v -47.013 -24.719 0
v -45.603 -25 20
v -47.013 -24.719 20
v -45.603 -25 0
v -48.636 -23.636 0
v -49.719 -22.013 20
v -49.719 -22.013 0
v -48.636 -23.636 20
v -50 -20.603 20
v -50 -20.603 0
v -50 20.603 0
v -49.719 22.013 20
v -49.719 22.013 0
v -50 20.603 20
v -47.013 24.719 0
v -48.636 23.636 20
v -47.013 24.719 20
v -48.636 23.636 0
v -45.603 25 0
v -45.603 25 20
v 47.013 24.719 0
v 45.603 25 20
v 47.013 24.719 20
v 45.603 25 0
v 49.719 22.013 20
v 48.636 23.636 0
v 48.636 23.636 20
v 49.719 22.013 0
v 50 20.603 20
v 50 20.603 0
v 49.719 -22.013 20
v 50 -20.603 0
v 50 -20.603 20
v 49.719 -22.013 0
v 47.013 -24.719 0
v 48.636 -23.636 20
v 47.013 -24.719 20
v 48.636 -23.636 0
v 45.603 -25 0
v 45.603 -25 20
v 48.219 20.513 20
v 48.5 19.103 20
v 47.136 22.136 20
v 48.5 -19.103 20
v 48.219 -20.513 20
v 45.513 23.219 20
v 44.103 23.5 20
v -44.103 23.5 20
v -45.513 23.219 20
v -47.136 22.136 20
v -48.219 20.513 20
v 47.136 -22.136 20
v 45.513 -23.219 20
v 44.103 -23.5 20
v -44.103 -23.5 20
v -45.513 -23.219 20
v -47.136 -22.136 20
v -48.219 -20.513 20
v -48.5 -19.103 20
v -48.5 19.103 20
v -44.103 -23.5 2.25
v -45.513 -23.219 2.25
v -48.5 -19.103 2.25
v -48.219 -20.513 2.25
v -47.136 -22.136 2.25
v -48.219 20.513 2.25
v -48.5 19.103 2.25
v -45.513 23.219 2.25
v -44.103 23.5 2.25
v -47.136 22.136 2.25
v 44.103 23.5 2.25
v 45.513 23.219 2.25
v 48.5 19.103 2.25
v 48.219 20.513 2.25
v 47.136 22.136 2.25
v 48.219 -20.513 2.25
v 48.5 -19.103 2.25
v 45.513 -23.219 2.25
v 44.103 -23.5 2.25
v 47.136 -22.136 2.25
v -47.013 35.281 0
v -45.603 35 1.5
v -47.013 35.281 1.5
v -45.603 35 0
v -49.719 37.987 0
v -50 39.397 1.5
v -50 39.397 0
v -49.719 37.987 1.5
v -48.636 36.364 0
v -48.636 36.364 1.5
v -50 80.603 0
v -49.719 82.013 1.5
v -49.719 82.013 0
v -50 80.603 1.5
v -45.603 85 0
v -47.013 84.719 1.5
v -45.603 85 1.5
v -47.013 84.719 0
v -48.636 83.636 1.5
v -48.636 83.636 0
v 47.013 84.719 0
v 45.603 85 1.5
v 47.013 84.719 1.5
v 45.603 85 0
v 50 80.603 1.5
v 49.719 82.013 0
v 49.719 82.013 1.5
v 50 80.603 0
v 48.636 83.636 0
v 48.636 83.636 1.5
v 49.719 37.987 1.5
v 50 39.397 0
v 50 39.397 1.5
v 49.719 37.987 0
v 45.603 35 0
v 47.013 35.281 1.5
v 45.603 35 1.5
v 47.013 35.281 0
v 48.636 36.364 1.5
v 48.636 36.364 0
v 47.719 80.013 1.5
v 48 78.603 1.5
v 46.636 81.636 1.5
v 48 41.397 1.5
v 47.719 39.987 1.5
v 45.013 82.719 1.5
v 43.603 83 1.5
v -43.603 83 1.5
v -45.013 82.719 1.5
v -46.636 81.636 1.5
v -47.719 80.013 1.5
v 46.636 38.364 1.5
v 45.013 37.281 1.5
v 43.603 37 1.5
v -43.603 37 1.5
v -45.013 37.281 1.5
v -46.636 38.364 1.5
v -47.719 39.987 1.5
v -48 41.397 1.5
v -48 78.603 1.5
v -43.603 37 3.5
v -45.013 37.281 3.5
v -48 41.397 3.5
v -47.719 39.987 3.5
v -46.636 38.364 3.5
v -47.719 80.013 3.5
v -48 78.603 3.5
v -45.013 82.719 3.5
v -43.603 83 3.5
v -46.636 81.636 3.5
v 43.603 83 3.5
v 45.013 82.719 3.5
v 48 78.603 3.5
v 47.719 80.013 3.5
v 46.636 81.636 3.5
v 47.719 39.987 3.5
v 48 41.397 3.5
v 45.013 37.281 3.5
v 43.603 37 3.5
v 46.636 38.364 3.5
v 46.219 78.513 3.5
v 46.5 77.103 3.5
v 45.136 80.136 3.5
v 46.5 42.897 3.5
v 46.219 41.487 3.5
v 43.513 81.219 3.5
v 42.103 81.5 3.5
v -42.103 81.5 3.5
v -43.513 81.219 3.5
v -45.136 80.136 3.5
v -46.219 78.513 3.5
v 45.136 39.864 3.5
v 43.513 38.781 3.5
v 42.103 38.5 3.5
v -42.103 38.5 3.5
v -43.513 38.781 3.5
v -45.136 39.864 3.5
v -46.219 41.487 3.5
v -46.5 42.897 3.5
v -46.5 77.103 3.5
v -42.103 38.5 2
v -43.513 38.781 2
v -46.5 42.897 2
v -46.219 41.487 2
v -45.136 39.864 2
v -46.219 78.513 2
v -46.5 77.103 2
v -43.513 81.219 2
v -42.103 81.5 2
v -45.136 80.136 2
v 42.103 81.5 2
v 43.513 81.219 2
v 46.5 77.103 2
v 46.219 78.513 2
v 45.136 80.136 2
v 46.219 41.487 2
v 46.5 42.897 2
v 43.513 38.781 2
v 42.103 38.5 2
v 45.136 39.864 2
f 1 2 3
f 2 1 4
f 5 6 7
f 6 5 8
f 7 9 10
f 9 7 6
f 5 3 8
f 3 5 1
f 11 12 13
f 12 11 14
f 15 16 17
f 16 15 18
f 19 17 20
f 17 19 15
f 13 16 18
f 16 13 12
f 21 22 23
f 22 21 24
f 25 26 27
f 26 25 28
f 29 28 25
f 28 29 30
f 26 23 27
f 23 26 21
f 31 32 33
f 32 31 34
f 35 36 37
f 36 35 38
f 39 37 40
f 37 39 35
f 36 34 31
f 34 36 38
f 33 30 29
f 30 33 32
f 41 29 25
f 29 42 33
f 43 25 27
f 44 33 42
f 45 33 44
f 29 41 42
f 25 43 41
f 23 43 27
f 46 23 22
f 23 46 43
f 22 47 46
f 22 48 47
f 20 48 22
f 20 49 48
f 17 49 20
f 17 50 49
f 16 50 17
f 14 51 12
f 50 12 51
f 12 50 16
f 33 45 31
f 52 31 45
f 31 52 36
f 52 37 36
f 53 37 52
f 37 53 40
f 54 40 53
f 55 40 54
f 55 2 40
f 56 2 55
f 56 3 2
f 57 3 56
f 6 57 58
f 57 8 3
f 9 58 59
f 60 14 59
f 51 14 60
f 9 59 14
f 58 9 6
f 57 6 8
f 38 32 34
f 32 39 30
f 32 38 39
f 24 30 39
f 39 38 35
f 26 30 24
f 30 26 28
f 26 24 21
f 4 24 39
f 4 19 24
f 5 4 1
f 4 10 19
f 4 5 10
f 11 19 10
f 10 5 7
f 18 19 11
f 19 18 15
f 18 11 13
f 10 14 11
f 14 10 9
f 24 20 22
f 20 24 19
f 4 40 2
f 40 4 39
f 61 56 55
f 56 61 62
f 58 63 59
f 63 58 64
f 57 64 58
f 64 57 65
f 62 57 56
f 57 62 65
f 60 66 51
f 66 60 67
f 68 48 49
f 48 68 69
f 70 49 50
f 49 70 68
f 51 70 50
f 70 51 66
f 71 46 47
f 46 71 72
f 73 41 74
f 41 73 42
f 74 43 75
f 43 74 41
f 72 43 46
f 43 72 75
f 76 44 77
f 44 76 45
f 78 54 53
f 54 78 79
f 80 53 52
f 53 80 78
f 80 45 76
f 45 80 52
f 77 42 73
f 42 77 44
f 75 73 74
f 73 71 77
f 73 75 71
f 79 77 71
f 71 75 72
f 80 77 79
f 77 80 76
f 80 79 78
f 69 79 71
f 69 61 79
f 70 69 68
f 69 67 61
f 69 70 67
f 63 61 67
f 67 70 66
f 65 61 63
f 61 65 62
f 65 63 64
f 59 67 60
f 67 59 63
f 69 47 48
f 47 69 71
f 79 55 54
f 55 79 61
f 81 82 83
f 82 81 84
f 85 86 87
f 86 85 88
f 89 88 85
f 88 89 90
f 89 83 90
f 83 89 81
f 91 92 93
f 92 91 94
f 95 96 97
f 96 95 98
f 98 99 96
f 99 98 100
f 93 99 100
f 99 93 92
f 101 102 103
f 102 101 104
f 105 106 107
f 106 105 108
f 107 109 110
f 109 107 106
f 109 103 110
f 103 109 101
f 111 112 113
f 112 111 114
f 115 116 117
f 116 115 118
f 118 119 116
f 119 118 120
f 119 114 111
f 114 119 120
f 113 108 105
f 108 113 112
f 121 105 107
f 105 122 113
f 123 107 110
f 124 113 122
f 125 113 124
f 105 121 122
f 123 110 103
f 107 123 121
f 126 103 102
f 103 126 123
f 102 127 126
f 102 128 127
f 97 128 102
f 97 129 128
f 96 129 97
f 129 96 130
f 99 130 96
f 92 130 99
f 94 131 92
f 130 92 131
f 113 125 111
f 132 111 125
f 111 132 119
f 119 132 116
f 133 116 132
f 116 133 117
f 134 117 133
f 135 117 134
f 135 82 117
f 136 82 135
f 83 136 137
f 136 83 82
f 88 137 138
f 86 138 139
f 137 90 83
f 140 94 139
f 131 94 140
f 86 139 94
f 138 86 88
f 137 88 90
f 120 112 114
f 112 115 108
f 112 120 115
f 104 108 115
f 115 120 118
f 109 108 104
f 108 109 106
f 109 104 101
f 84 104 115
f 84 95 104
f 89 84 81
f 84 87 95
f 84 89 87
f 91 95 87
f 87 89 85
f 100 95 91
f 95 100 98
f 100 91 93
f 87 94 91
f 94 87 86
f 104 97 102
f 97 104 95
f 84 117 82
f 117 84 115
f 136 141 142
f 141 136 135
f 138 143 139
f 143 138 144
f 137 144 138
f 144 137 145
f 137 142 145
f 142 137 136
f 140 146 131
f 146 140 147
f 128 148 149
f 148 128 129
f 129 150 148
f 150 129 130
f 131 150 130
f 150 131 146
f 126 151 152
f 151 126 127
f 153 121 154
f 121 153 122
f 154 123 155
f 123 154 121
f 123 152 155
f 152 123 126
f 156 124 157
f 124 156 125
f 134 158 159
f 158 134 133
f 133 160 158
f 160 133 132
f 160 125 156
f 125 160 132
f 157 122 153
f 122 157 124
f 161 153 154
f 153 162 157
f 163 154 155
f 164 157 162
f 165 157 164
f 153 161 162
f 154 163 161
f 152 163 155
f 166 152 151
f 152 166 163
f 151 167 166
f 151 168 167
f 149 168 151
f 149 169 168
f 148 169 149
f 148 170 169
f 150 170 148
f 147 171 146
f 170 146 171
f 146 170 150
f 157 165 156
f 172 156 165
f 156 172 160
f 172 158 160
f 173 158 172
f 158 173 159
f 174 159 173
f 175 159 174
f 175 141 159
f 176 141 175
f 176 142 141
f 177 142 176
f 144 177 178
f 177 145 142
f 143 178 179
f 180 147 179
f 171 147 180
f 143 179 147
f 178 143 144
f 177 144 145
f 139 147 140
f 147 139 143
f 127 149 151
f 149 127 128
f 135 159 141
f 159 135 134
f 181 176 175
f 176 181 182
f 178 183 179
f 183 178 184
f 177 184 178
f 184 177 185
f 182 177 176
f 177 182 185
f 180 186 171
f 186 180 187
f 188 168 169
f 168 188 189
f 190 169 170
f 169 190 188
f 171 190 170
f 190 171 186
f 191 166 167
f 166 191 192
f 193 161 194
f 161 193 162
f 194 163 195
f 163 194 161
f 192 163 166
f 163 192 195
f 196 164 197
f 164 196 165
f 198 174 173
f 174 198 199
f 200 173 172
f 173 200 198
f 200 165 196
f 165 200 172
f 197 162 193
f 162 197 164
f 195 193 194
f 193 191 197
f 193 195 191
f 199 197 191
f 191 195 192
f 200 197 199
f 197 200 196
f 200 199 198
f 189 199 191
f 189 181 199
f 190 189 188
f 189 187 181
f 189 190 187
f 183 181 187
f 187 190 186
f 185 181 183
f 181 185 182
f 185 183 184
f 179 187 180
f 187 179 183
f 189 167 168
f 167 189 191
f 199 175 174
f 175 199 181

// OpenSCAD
//
// Customized Enclosure
//

/*[Dimensions]*/

// Width of the enclosure
width = 100.0;
// Height of the enclosure
height = 50.0;
// Depth of the enclosure
depth = 20.0;
// Thickness of the walls and lid
thickness = 1.5;
// Amount of corner rounding
fillet_radius = 5.0;

/* [Lid] */

// Lid Type
lid_type = "Partial"; //[None, Simple, Partial, Full]
// Width of partial lip
lip_width = 4;
// Additional height added to lip
lip_added_height = 1;
// Extra Lid spacing
lid_space = 1;


if (lid_type == "None") {
    enclosure(width, height, depth, fillet_radius, thickness);
}
if (lid_type == "Simple") {
    enclosure(width, height, depth, fillet_radius, thickness);
    simple_lid(width, height, fillet_radius, thickness);
}
if (lid_type == "Partial") {
    enclosure(width, height, depth, fillet_radius, thickness);
    partial_lip_lid(width, height, fillet_radius, thickness);
}
if (lid_type == "Full") {
    enclosure(width, height, depth, fillet_radius, thickness);
    full_lip_lid(width, height, fillet_radius, thickness);
}

// 
// builds a solid rectangle with rounded corners (Z-only)
//
module block(width, height, depth, fillet_radius) {
    
    difference() {
        cube([width, height, depth], center = true);
        
        fudge = 0.1;
        fudge_depth = depth + 1.0;
        
        translate([-(width / 2 + fudge), -(height / 2 + fudge), -(fudge_depth / 2)])
        intersection () {
            cube([fillet_radius, fillet_radius, fudge_depth], center = false); 
            difference() {
                    cube([2 * fillet_radius, 2 * fillet_radius, fudge_depth], center = false); 
                    translate([fillet_radius, fillet_radius, 0.0])
                    cylinder(r = fillet_radius, h = fudge_depth);
            }
        }

        translate([-(width / 2 + fudge), (height / 2 + fudge), -(fudge_depth / 2)])
        rotate([0.0, 0.0, -90])
        intersection () {
            cube([fillet_radius, fillet_radius, fudge_depth], center = false); 
            difference() {
                    cube([2 * fillet_radius, 2 * fillet_radius, fudge_depth], center = false); 
                    translate([fillet_radius, fillet_radius, 0.0])
                    cylinder(r = fillet_radius, h = fudge_depth);
            }
        }

        translate([(width / 2 + fudge), (height / 2 + fudge), -(fudge_depth / 2)])
        rotate([0.0, 0.0, 180])
        intersection () {
            cube([fillet_radius, fillet_radius, fudge_depth], center = false); 
            difference() {
                    cube([2 * fillet_radius, 2 * fillet_radius, fudge_depth], center = false); 
                    translate([fillet_radius, fillet_radius, 0.0])
                    cylinder(r = fillet_radius, h = fudge_depth);
            }
        }

        translate([(width / 2 + fudge), -(height / 2 + fudge), -(fudge_depth / 2)])
        rotate([0.0, 0.0, 90])
        intersection () {
            cube([fillet_radius, fillet_radius, fudge_depth], center = false); 
            difference() {
                    cube([2 * fillet_radius, 2 * fillet_radius, fudge_depth], center = false); 
                    translate([fillet_radius, fillet_radius, 0.0])
                    cylinder(r = fillet_radius, h = fudge_depth);
            }
        }
    }
}

module enclosure(width, height, depth, fillet_radius, thickness) {
    translate([0.0, 0.0, depth / 2.0])
    difference() {
        block(width, height, depth, fillet_radius);
        translate([0.0, 0.0, thickness]) 
            block(width - (2 * thickness), height - (2 * thickness), depth - thickness, fillet_radius);
    }
}

module simple_lid(width, height, fillet_radius, thickness) {
    translate([0.0, height + 10, thickness / 2.0])
        block(width, height, thickness, fillet_radius);
}

module partial_lip_lid(width, height, fillet_radius, thickness) {
    difference() {
        union() {
            translate([0.0, height + 10, thickness / 2.0])
                block(width, height, thickness, fillet_radius);
            translate([0.0, height + 10, thickness / 2.0 + thickness])
                block(width - (2 * thickness) - lid_space, height - (2 * thickness) - lid_space, thickness + lip_added_height, fillet_radius);
        }
        translate([0.0, height + 10, thickness / 2.0 + thickness + 1])
            block((width - (2 * thickness)) - lip_width, (height - (2 * thickness)) - lip_width, thickness + lip_added_height, fillet_radius );
    }
}

module full_lip_lid(width, height, fillet_radius, thickness) {
    union() {
        translate([0.0, height + 10, thickness / 2.0])
            block(width, height, thickness, fillet_radius);
        translate([0.0, height + 10, thickness / 2.0 + thickness])
            block(width - (2 * thickness) - lid_space, height - (2 * thickness) - lid_space, thickness + lip_added_height, fillet_radius);
    }
}
